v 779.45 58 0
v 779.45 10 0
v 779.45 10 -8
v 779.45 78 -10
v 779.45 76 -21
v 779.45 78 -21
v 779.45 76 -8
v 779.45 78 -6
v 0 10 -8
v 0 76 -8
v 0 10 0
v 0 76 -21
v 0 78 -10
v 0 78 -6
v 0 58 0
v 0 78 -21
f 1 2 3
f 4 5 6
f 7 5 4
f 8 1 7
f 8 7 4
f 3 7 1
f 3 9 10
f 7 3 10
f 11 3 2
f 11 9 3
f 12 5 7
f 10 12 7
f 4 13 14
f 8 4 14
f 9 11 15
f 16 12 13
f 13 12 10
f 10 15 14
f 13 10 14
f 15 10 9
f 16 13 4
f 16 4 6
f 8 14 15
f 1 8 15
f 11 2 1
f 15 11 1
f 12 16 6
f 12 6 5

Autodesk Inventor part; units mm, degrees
ref_plane "YZ Plane" through (0, 0, 0) normal (1, 0, 0) x (0, 1, 0)
ref_plane "XZ Plane" through (0, 0, 0) normal (0, 1, 0) x (-1, 0, 0)
ref_plane "XY Plane" through (0, 0, 0) normal (0, 0, 1) x (1, 0, 0)
sketch "Sketch1" plane through (0, 0, 0) normal (1, 0, 0) x (0, 1, 0)
  line L0 (10, 0) -> (58, 0)
  line L1 (78, -10) -> (78, -21)
  line L2 (78, -21) -> (78, -10)
  line L3 (78, -21) -> (78, -10)
  line L4 (78, -10) -> (78, -21)
  line L5 (58, 0) -> (10, 0)
  line L6 (58, 0) -> (10, 0)
  line L7 (78, -21) -> (78, -6)
  line L8 (78, -6) -> (58, 0)
  line L9 (78, -21) -> (76, -21)
  line L10 (76, -21) -> (76, -8)
  line L11 (10, -8) -> (76, -8)
  line L12 (10, -8) -> (10, 0)
  point P0 (0, 0)
  dimension "d6" = 15
  dimension "d9" = 2
extrude "Extrusion1" add sketch "Sketch1" along normal blind 779.45
properties part number "Blackside" material "Steel"
